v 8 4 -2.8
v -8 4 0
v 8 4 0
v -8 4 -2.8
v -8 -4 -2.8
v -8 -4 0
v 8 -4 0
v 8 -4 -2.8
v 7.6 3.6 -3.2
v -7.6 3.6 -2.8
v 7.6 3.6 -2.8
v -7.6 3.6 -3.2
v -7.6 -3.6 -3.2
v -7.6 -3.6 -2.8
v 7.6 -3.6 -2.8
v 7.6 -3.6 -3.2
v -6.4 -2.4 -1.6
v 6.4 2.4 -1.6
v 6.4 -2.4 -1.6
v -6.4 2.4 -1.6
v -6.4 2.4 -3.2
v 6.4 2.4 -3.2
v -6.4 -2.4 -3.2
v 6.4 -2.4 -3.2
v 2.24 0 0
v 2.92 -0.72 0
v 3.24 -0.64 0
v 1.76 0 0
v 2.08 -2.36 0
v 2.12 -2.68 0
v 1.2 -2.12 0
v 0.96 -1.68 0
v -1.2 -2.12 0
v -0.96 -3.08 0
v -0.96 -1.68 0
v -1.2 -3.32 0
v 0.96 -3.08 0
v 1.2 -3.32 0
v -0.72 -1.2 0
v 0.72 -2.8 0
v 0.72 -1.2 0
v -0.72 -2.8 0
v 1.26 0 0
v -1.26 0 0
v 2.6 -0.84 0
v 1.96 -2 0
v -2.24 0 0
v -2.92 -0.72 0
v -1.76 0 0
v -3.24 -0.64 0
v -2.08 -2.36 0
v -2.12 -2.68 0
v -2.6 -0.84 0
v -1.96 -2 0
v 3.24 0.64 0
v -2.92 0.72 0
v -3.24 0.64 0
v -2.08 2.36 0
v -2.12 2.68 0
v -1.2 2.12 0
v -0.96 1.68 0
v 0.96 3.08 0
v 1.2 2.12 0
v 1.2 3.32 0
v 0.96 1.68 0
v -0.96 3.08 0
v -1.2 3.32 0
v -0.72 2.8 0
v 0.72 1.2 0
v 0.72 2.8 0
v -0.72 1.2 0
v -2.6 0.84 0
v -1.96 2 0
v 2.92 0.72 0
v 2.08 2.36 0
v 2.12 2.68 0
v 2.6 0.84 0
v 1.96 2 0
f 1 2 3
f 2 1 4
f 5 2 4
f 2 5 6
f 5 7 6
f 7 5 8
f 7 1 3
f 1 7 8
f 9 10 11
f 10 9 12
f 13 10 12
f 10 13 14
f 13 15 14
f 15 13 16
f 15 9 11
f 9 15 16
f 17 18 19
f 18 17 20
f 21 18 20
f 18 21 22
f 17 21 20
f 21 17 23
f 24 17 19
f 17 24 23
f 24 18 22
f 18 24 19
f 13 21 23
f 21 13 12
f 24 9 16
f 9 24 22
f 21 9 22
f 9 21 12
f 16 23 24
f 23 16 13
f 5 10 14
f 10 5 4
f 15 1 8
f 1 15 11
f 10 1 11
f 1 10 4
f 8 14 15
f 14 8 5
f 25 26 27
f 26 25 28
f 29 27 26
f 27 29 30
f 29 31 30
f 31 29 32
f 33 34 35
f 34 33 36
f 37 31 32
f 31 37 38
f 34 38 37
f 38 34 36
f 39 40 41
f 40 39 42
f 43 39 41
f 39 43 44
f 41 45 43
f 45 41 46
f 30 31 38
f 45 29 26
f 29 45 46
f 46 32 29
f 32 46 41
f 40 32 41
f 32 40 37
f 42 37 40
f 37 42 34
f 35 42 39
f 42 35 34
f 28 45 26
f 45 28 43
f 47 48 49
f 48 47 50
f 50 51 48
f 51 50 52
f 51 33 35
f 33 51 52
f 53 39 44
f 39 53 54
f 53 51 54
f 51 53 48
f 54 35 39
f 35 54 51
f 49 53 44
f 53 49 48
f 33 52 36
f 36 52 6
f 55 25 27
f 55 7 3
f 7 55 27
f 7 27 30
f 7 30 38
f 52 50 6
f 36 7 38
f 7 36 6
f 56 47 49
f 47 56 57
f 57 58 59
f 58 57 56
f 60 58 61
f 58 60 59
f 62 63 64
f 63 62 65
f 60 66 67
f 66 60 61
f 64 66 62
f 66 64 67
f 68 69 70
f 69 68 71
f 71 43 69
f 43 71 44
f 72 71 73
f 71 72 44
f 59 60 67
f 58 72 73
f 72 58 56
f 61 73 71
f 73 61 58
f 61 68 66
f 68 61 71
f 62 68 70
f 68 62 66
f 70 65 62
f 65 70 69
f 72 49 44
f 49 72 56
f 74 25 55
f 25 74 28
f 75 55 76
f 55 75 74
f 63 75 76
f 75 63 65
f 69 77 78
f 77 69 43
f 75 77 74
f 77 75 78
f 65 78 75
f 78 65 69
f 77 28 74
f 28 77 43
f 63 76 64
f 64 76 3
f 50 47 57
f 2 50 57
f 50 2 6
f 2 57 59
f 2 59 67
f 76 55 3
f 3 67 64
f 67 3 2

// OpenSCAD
// file: ../p/box5.scad
use <../lib.scad>
function ldraw_lib__box5() = [
// 0 Box with 5 Faces and All Edges
// 0 Name: box5.dat
// 0 Author: James Jessiman
// 0 !LDRAW_ORG Primitive UPDATE 2012-01
// 0 !LICENSE Licensed under CC BY 4.0 : see CAreadme.txt
// 
// 0 BFC CERTIFY CCW
  [0,"BFC","CERTIFY"],
  [0,"BFC","CCW"],
// 
// 0 !HISTORY 2002-04-03 [sbliss] Modified for BFC compliance
// 0 !HISTORY 2002-04-25 [PTadmin] Official Update 2002-02
// 0 !HISTORY 2007-06-24 [PTadmin] Header formatted for Contributor Agreement
// 0 !HISTORY 2008-07-01 [PTadmin] Official Update 2008-01
// 0 !HISTORY 2012-02-16 [Philo] Changed to CCW
// 0 !HISTORY 2012-03-30 [PTadmin] Official Update 2012-01
// 
// 
// 2 24 1 1 1 -1 1 1
  [2,24,1,1,1,-1,1,1],
// 2 24 -1 1 1 -1 1 -1
  [2,24,-1,1,1,-1,1,-1],
// 2 24 -1 1 -1 1 1 -1
  [2,24,-1,1,-1,1,1,-1],
// 2 24 1 1 -1 1 1 1
  [2,24,1,1,-1,1,1,1],
// 2 24 1 0 1 -1 0 1
  [2,24,1,0,1,-1,0,1],
// 2 24 -1 0 1 -1 0 -1
  [2,24,-1,0,1,-1,0,-1],
// 2 24 -1 0 -1 1 0 -1
  [2,24,-1,0,-1,1,0,-1],
// 2 24 1 0 -1 1 0 1
  [2,24,1,0,-1,1,0,1],
// 2 24 1 0 1 1 1 1
  [2,24,1,0,1,1,1,1],
// 2 24 -1 0 1 -1 1 1
  [2,24,-1,0,1,-1,1,1],
// 2 24 1 0 -1 1 1 -1
  [2,24,1,0,-1,1,1,-1],
// 2 24 -1 0 -1 -1 1 -1
  [2,24,-1,0,-1,-1,1,-1],
// 4 16 -1 1 1 1 1 1 1 1 -1 -1 1 -1
  [4,16,-1,1,1,1,1,1,1,1,-1,-1,1,-1],
// 4 16 -1 1 1 -1 0 1 1 0 1 1 1 1
  [4,16,-1,1,1,-1,0,1,1,0,1,1,1,1],
// 4 16 -1 1 -1 -1 0 -1 -1 0 1 -1 1 1
  [4,16,-1,1,-1,-1,0,-1,-1,0,1,-1,1,1],
// 4 16 1 1 -1 1 0 -1 -1 0 -1 -1 1 -1
  [4,16,1,1,-1,1,0,-1,-1,0,-1,-1,1,-1],
// 4 16 1 1 1 1 0 1 1 0 -1 1 1 -1
  [4,16,1,1,1,1,0,1,1,0,-1,1,1,-1],
];
module ldraw_lib__box5(step=0, col=false, unit=2/5, alt=false, line=0.2, solid=!$preview)
    makepoly(ldraw_lib__box5(), step=step, col=col, unit=unit, alt=alt, line=line, solid=solid);
ldraw_lib__box5(line=0.2);
// file: ../p/box4.scad
use <../lib.scad>
function ldraw_lib__box4() = [
// 0 Box with 4 Faces (2 Parallel Pairs) and All Edges
// 0 Name: box4.dat
// 0 Author: James Jessiman
// 0 !LDRAW_ORG Primitive UPDATE 2012-01
// 0 !LICENSE Licensed under CC BY 4.0 : see CAreadme.txt
// 
// 0 BFC CERTIFY CCW
  [0,"BFC","CERTIFY"],
  [0,"BFC","CCW"],
// 
// 0 !HISTORY 2002-04-03 [sbliss] Modified for BFC compliance
// 0 !HISTORY 2002-04-25 [PTadmin] Official Update 2002-02
// 0 !HISTORY 2007-06-24 [PTadmin] Header formatted for Contributor Agreement
// 0 !HISTORY 2008-07-01 [PTadmin] Official Update 2008-01
// 0 !HISTORY 2012-02-16 [Philo] Changed to CCW
// 0 !HISTORY 2012-03-30 [PTadmin] Official Update 2012-01
// 
// 
// 2 24 1 1 1 -1 1 1
  [2,24,1,1,1,-1,1,1],
// 2 24 -1 1 1 -1 1 -1
  [2,24,-1,1,1,-1,1,-1],
// 2 24 -1 1 -1 1 1 -1
  [2,24,-1,1,-1,1,1,-1],
// 2 24 1 1 -1 1 1 1
  [2,24,1,1,-1,1,1,1],
// 2 24 1 0 1 -1 0 1
  [2,24,1,0,1,-1,0,1],
// 2 24 -1 0 1 -1 0 -1
  [2,24,-1,0,1,-1,0,-1],
// 2 24 -1 0 -1 1 0 -1
  [2,24,-1,0,-1,1,0,-1],
// 2 24 1 0 -1 1 0 1
  [2,24,1,0,-1,1,0,1],
// 2 24 1 0 1 1 1 1
  [2,24,1,0,1,1,1,1],
// 2 24 -1 0 1 -1 1 1
  [2,24,-1,0,1,-1,1,1],
// 2 24 1 0 -1 1 1 -1
  [2,24,1,0,-1,1,1,-1],
// 2 24 -1 0 -1 -1 1 -1
  [2,24,-1,0,-1,-1,1,-1],
// 4 16 -1 1 1 -1 0 1 1 0 1 1 1 1
  [4,16,-1,1,1,-1,0,1,1,0,1,1,1,1],
// 4 16 -1 1 -1 -1 0 -1 -1 0 1 -1 1 1
  [4,16,-1,1,-1,-1,0,-1,-1,0,1,-1,1,1],
// 4 16 1 1 -1 1 0 -1 -1 0 -1 -1 1 -1
  [4,16,1,1,-1,1,0,-1,-1,0,-1,-1,1,-1],
// 4 16 1 1 1 1 0 1 1 0 -1 1 1 -1
  [4,16,1,1,1,1,0,1,1,0,-1,1,1,-1],
];
module ldraw_lib__box4(step=0, col=false, unit=2/5, alt=false, line=0.2, solid=!$preview)
    makepoly(ldraw_lib__box4(), step=step, col=col, unit=unit, alt=alt, line=line, solid=solid);
ldraw_lib__box4(line=0.2);
// file: s/3069bs01.scad
use <../../lib.scad>
use <../../p/box4.scad>
use <../../p/box5.scad>
function ldraw_lib__s__3069bs01() = [
// 0 ~Tile  1 x  2 with Groove without Top Face
// 0 Name: s\3069bs01.dat
// 0 Author: Santeri Piippo [arezey]
// 0 !LDRAW_ORG Subpart UPDATE 2010-02
// 0 !LICENSE Licensed under CC BY 4.0 : see CAreadme.txt
// 
// 0 BFC CERTIFY CCW
  [0,"BFC","CERTIFY"],
  [0,"BFC","CCW"],
// 
// 0 !HISTORY 2010-07-05 [PTadmin] Official Update 2010-02
// 
// 
// 1 16 0 0 0 20 0 0 0 7 0 0 0 10 box4.dat
  [1,16,0,0,0,20,0,0,0,7,0,0,0,10, ldraw_lib__box4()],
// 1 16 0 7 0 19 0 0 0 1 0 0 0 9 box4.dat
  [1,16,0,7,0,19,0,0,0,1,0,0,0,9, ldraw_lib__box4()],
// 0 BFC INVERTNEXT
  [0,"BFC","INVERTNEXT"],
// 1 16 0 8 0 16 0 0 0 -4 0 0 0 6 box5.dat
  [1,16,0,8,0,16,0,0,0,-4,0,0,0,6, ldraw_lib__box5()],
// 4 16 -19 8 9 -16 8 6 -16 8 -6 -19 8 -9
  [4,16,-19,8,9,-16,8,6,-16,8,-6,-19,8,-9],
// 4 16 19 8 -9 16 8 -6 16 8 6 19 8 9
  [4,16,19,8,-9,16,8,-6,16,8,6,19,8,9],
// 4 16 19 8 9 16 8 6 -16 8 6 -19 8 9
  [4,16,19,8,9,16,8,6,-16,8,6,-19,8,9],
// 4 16 -19 8 -9 -16 8 -6 16 8 -6 19 8 -9
  [4,16,-19,8,-9,-16,8,-6,16,8,-6,19,8,-9],
// 4 16 -20 7 10 -19 7 9 -19 7 -9 -20 7 -10
  [4,16,-20,7,10,-19,7,9,-19,7,-9,-20,7,-10],
// 4 16 20 7 -10 19 7 -9 19 7 9 20 7 10
  [4,16,20,7,-10,19,7,-9,19,7,9,20,7,10],
// 4 16 20 7 10 19 7 9 -19 7 9 -20 7 10
  [4,16,20,7,10,19,7,9,-19,7,9,-20,7,10],
// 4 16 -20 7 -10 -19 7 -9 19 7 -9 20 7 -10
  [4,16,-20,7,-10,-19,7,-9,19,7,-9,20,7,-10],
// 0 //
];
module ldraw_lib__s__3069bs01(step=0, col=false, unit=2/5, alt=false, line=0.2, solid=!$preview)
    makepoly(ldraw_lib__s__3069bs01(), step=step, col=col, unit=unit, alt=alt, line=line, solid=solid);
ldraw_lib__s__3069bs01(line=0.2);
// file: s/3069bp0us01.scad
use <../../lib.scad>
function ldraw_lib__s__3069bp0us01() = [
// 0 ~Tile  1 x  2 with Dark Turquoise EMT Star of Life Half Pattern
// 0 Name: s\3069bp0us01.dat
// 0 Author: Philippe Hurbain [Philo]
// 0 !LDRAW_ORG Subpart UPDATE 2024-04
// 0 !LICENSE Licensed under CC BY 4.0 : see CAreadme.txt
// 
// 0 BFC CERTIFY CCW
  [0,"BFC","CERTIFY"],
  [0,"BFC","CCW"],
// 
// 0 !HISTORY 2024-05-28 [OrionP] Official Update 2024-04
// 
// 4 3 -4.4 0 0 -7.3 0 1.8 -8.1 0 1.6 -5.6 0 0
  [4,3,-4.4,0,0,-7.3,0,1.8,-8.1,0,1.6,-5.6,0,0],
// 4 3 -7.3 0 1.8 -5.2 0 5.9 -5.3 0 6.7 -8.1 0 1.6
  [4,3,-7.3,0,1.8,-5.2,0,5.9,-5.3,0,6.7,-8.1,0,1.6],
// 4 3 -2.4 0 4.2 -3 0 5.3 -5.3 0 6.7 -5.2 0 5.9
  [4,3,-2.4,0,4.2,-3,0,5.3,-5.3,0,6.7,-5.2,0,5.9],
// 4 3 3 0 8.3 2.4 0 7.7 2.4 0 4.2 3 0 5.3
  [4,3,3,0,8.3,2.4,0,7.7,2.4,0,4.2,3,0,5.3],
// 4 3 -2.4 0 4.2 -2.4 0 7.7 -3 0 8.3 -3 0 5.3
  [4,3,-2.4,0,4.2,-2.4,0,7.7,-3,0,8.3,-3,0,5.3],
// 4 3 -3 0 8.3 -2.4 0 7.7 2.4 0 7.7 3 0 8.3
  [4,3,-3,0,8.3,-2.4,0,7.7,2.4,0,7.7,3,0,8.3],
// 4 3 1.8 0 3 1.8 0 7 -1.8 0 7 -1.8 0 3
  [4,3,1.8,0,3,1.8,0,7,-1.8,0,7,-1.8,0,3],
// 4 3 -3.15 0 0 3.15 0 0 1.8 0 3 -1.8 0 3
  [4,3,-3.15,0,0,3.15,0,0,1.8,0,3,-1.8,0,3],
// 4 3 -4.9 0 5 -6.5 0 2.1 -3.15 0 0 -1.8 0 3
  [4,3,-4.9,0,5,-6.5,0,2.1,-3.15,0,0,-1.8,0,3],
// 3 16 -5.3 0 6.7 -3 0 5.3 -3 0 8.3
  [3,16,-5.3,0,6.7,-3,0,5.3,-3,0,8.3],
// 4 16 -5.2 0 5.9 -7.3 0 1.8 -6.5 0 2.1 -4.9 0 5
  [4,16,-5.2,0,5.9,-7.3,0,1.8,-6.5,0,2.1,-4.9,0,5],
// 4 16 -1.8 0 3 -2.4 0 4.2 -5.2 0 5.9 -4.9 0 5
  [4,16,-1.8,0,3,-2.4,0,4.2,-5.2,0,5.9,-4.9,0,5],
// 4 16 -1.8 0 3 -1.8 0 7 -2.4 0 7.7 -2.4 0 4.2
  [4,16,-1.8,0,3,-1.8,0,7,-2.4,0,7.7,-2.4,0,4.2],
// 4 16 -1.8 0 7 1.8 0 7 2.4 0 7.7 -2.4 0 7.7
  [4,16,-1.8,0,7,1.8,0,7,2.4,0,7.7,-2.4,0,7.7],
// 4 16 1.8 0 3 2.4 0 4.2 2.4 0 7.7 1.8 0 7
  [4,16,1.8,0,3,2.4,0,4.2,2.4,0,7.7,1.8,0,7],
// 4 16 -3.15 0 0 -6.5 0 2.1 -7.3 0 1.8 -4.4 0 0
  [4,16,-3.15,0,0,-6.5,0,2.1,-7.3,0,1.8,-4.4,0,0],
// 4 3 8.1 0 1.6 7.3 0 1.8 4.4 0 0 5.6 0 0
  [4,3,8.1,0,1.6,7.3,0,1.8,4.4,0,0,5.6,0,0],
// 4 3 7.3 0 1.8 8.1 0 1.6 5.3 0 6.7 5.2 0 5.9
  [4,3,7.3,0,1.8,8.1,0,1.6,5.3,0,6.7,5.2,0,5.9],
// 4 3 5.3 0 6.7 3 0 5.3 2.4 0 4.2 5.2 0 5.9
  [4,3,5.3,0,6.7,3,0,5.3,2.4,0,4.2,5.2,0,5.9],
// 4 3 4.9 0 5 1.8 0 3 3.15 0 0 6.5 0 2.1
  [4,3,4.9,0,5,1.8,0,3,3.15,0,0,6.5,0,2.1],
// 4 16 5.2 0 5.9 4.9 0 5 6.5 0 2.1 7.3 0 1.8
  [4,16,5.2,0,5.9,4.9,0,5,6.5,0,2.1,7.3,0,1.8],
// 4 16 5.2 0 5.9 2.4 0 4.2 1.8 0 3 4.9 0 5
  [4,16,5.2,0,5.9,2.4,0,4.2,1.8,0,3,4.9,0,5],
// 4 16 3.15 0 0 4.4 0 0 7.3 0 1.8 6.5 0 2.1
  [4,16,3.15,0,0,4.4,0,0,7.3,0,1.8,6.5,0,2.1],
// 3 16 3 0 5.3 5.3 0 6.7 3 0 8.3
  [3,16,3,0,5.3,5.3,0,6.7,3,0,8.3],
// 3 16 3 0 8.3 5.3 0 6.7 20 0 10
  [3,16,3,0,8.3,5.3,0,6.7,20,0,10],
// 3 16 -8.1 0 -1.6 -5.6 0 0 -8.1 0 1.6
  [3,16,-8.1,0,-1.6,-5.6,0,0,-8.1,0,1.6],
// 4 16 -20 0 10 -20 0 -10 -8.1 0 -1.6 -8.1 0 1.6
  [4,16,-20,0,10,-20,0,-10,-8.1,0,-1.6,-8.1,0,1.6],
// 3 16 -20 0 10 -8.1 0 1.6 -5.3 0 6.7
  [3,16,-20,0,10,-8.1,0,1.6,-5.3,0,6.7],
// 3 16 -20 0 10 -5.3 0 6.7 -3 0 8.3
  [3,16,-20,0,10,-5.3,0,6.7,-3,0,8.3],
// 3 16 5.3 0 6.7 8.1 0 1.6 20 0 10
  [3,16,5.3,0,6.7,8.1,0,1.6,20,0,10],
// 4 16 -3 0 8.3 3 0 8.3 20 0 10 -20 0 10
  [4,16,-3,0,8.3,3,0,8.3,20,0,10,-20,0,10],
];
module ldraw_lib__s__3069bp0us01(step=0, col=false, unit=2/5, alt=false, line=0.2, solid=!$preview)
    makepoly(ldraw_lib__s__3069bp0us01(), step=step, col=col, unit=unit, alt=alt, line=line, solid=solid);
ldraw_lib__s__3069bp0us01(line=0.2);
// main file
use <../lib.scad>
use <s/3069bp0us01.scad>
use <s/3069bs01.scad>
function ldraw_lib__3069bp0u() = [
// 0 Tile  1 x  2 with Dark Turquoise EMT Star of Life Pattern
// 0 Name: 3069bp0u.dat
// 0 Author: Philippe Hurbain [Philo]
// 0 !LDRAW_ORG Part UPDATE 2024-04
// 0 !LICENSE Licensed under CC BY 4.0 : see CAreadme.txt
// 
// 0 BFC CERTIFY CCW
  [0,"BFC","CERTIFY"],
  [0,"BFC","CCW"],
// 
// 0 !KEYWORDS Bricklink 3069pb1170, Rebrickable 3069bpr0376, Set 60377, Set 60378
// 
// 0 !HISTORY 2024-05-28 [OrionP] Official Update 2024-04
// 
// 1 16 0 0 0 1 0 0 0 1 0 0 0 1 s\3069bs01.dat
  [1,16,0,0,0,1,0,0,0,1,0,0,0,1, ldraw_lib__s__3069bs01()],
// 1 16 0 0 0 -1 0 0 0 1 0 0 0 -1 s\3069bp0us01.dat
  [1,16,0,0,0,-1,0,0,0,1,0,0,0,-1, ldraw_lib__s__3069bp0us01()],
// 1 16 0 0 0 1 0 0 0 1 0 0 0 1 s\3069bp0us01.dat
  [1,16,0,0,0,1,0,0,0,1,0,0,0,1, ldraw_lib__s__3069bp0us01()],
];
module ldraw_lib__3069bp0u(step=0, col=false, unit=2/5, alt=false, line=0.2, solid=!$preview)
    makepoly(ldraw_lib__3069bp0u(), step=step, col=col, unit=unit, alt=alt, line=line, solid=solid);
ldraw_lib__3069bp0u(line=0.2);
